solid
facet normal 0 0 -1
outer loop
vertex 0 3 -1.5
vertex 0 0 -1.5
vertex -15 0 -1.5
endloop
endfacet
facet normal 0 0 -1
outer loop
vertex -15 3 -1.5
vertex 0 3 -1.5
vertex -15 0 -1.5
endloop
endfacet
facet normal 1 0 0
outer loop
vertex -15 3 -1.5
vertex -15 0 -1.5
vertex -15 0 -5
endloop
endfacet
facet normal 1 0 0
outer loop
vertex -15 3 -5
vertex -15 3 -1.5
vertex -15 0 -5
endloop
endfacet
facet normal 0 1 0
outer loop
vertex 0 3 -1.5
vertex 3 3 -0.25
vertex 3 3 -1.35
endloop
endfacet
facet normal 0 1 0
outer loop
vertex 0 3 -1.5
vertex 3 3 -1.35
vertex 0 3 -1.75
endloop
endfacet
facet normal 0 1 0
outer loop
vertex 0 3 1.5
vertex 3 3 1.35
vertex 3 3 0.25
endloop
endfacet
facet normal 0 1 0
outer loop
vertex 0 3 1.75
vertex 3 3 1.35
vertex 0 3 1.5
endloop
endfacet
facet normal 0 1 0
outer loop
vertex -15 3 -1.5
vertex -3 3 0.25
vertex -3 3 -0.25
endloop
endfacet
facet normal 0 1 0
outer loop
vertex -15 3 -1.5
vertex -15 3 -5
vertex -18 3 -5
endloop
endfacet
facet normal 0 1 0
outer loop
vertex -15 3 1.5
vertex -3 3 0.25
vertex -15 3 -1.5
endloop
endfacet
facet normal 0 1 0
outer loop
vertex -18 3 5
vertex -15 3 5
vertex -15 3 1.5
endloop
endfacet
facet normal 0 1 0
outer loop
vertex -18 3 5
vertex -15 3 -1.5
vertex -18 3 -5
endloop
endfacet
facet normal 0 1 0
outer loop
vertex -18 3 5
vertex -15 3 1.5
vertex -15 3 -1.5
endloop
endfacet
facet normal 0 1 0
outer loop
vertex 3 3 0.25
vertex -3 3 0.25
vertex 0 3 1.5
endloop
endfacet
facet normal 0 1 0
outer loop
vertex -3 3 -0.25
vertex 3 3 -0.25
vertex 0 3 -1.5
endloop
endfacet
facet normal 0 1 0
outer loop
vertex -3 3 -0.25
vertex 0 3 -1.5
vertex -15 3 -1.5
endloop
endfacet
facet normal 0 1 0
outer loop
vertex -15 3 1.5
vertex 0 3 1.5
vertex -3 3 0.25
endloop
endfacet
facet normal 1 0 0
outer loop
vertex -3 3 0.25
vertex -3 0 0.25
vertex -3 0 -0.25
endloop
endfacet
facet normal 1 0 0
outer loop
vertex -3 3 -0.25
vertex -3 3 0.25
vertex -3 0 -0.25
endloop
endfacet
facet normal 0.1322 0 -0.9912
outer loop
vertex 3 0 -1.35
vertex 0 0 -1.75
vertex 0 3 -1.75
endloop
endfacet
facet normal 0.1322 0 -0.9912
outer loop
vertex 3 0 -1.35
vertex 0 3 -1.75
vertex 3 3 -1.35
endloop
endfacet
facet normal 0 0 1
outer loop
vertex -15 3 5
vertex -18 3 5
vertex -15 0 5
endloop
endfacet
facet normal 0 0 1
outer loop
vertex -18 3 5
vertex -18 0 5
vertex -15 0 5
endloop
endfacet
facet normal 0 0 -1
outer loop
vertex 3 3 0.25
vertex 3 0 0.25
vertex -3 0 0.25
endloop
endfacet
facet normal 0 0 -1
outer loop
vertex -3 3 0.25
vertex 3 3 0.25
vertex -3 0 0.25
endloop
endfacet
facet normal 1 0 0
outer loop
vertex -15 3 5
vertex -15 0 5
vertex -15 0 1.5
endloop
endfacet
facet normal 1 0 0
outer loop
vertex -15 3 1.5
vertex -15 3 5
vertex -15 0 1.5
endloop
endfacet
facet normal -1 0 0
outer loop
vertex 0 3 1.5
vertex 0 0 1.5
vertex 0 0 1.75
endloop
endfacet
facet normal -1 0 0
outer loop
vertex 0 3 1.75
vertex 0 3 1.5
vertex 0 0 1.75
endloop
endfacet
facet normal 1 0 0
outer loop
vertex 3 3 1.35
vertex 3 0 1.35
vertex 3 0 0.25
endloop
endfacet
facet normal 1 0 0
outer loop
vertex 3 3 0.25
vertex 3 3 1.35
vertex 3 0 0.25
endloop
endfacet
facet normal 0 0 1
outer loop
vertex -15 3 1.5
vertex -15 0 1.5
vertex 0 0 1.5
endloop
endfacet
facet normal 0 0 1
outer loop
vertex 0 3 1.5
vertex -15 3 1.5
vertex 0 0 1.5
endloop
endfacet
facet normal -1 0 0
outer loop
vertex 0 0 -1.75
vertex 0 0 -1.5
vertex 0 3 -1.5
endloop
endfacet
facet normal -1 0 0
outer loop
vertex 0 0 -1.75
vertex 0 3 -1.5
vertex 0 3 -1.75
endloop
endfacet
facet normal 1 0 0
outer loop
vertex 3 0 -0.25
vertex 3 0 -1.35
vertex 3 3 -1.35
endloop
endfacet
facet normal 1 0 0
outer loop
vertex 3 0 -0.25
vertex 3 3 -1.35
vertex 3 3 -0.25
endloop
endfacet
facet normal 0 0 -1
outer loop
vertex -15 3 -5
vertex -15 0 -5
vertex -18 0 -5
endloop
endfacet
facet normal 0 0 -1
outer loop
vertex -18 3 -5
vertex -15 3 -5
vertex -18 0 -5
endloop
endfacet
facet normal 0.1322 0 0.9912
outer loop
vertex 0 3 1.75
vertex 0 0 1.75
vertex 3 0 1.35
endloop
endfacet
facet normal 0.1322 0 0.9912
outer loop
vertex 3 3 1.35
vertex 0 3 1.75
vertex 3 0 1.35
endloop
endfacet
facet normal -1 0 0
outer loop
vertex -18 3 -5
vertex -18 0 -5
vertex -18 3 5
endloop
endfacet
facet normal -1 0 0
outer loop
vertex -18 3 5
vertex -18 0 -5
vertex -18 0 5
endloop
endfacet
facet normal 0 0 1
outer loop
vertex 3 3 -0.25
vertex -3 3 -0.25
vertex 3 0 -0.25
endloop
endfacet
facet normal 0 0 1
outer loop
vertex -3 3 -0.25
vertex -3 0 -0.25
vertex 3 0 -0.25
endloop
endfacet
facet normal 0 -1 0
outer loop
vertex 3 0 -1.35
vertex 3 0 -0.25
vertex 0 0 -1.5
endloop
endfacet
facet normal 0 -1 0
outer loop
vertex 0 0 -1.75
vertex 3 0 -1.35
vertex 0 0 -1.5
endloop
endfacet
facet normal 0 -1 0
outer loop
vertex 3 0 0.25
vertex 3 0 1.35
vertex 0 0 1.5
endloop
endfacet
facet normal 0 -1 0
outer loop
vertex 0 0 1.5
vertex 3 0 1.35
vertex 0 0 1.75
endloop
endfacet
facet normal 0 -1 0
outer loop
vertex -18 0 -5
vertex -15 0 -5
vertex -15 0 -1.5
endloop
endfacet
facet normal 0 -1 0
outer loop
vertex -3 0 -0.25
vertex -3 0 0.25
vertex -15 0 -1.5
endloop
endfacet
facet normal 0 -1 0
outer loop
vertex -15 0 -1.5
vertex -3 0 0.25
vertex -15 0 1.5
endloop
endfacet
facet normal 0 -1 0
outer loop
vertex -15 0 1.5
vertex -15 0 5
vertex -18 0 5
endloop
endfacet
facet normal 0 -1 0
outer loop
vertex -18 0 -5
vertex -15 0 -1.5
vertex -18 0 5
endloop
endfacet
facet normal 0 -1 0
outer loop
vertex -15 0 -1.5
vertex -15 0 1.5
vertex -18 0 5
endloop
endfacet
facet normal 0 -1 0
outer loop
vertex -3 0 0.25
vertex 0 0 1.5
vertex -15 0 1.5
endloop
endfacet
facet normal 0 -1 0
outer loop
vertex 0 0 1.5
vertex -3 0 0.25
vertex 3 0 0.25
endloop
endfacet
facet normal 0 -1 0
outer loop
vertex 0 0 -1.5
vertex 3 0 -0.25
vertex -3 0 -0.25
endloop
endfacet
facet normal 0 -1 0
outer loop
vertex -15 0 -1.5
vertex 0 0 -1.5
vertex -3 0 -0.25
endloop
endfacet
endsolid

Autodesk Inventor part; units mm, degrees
ref_plane "YZ Plane" through (0, 0, 0) normal (1, 0, 0) x (0, 1, 0)
ref_plane "XZ Plane" through (0, 0, 0) normal (0, 1, 0) x (-1, 0, 0)
ref_plane "XY Plane" through (0, 0, 0) normal (0, 0, 1) x (1, 0, 0)
sketch "草圖1" plane through (0, 0, 0) normal (0, 1, 0) x (-1, 0, 0)
  line L0 (15, 1.5) -> (0, 1.5)
  line L1 (0, 1.5) -> (0, -1.5)
  line L2 (0, -1.5) -> (15, -1.5)
  line L3 (15, -1.5) -> (15, 1.5)
  line L4 (18, 5) -> (15, 5)
  line L5 (15, 5) -> (15, -5)
  line L6 (15, -5) -> (18, -5)
  line L7 (18, -5) -> (18, 5)
  line L8 (0, 0) -> (15, 0)
  line L9 (0, 1.5) -> (0, 1.75)
  line L10 (0, 1.35) -> (-3, 1.35)
  line L11 (0, 1.75) -> (-3, 1.35)
  line L12 (-3, 1.35) -> (-3, 0.25)
  line L13 (-3, 0.25) -> (0, 0.25)
  line L14 (0, -1.5) -> (0, -1.75)
  line L15 (0, -1.35) -> (-3, -1.35)
  line L16 (0, -1.75) -> (-3, -1.35)
  line L17 (-3, -1.35) -> (-3, -0.25)
  line L18 (-3, -0.25) -> (0, -0.25)
  line L19 (0, 0.25) -> (3, 0.25)
  line L20 (3, 0.25) -> (3, -0.25)
  line L21 (3, -0.25) -> (0, -0.25)
  point P0 (0, -0.25)
  dimension "d0" = 3
  dimension "d1" = 15
  dimension "d2" = 10
  dimension "d3" = 3
  dimension "d4" = 0.25
  dimension "d5" = 3
  dimension "d6" = 0.15
  dimension "d7" = 1.1
  dimension "d10" = 3
extrude "擠出1" add sketch "草圖1" along normal blind 3 contours L3 L8 L20 L19 L1 L0 | L5 L4 L7 L6 L3 | L1 L10 L11 L9 | L3 L2 L1 L21 L20 L8 | L1 L13 L12 L10 | L14 L16 L15 L1 | L15 L17 L18 L1
properties part number "插銷A"
